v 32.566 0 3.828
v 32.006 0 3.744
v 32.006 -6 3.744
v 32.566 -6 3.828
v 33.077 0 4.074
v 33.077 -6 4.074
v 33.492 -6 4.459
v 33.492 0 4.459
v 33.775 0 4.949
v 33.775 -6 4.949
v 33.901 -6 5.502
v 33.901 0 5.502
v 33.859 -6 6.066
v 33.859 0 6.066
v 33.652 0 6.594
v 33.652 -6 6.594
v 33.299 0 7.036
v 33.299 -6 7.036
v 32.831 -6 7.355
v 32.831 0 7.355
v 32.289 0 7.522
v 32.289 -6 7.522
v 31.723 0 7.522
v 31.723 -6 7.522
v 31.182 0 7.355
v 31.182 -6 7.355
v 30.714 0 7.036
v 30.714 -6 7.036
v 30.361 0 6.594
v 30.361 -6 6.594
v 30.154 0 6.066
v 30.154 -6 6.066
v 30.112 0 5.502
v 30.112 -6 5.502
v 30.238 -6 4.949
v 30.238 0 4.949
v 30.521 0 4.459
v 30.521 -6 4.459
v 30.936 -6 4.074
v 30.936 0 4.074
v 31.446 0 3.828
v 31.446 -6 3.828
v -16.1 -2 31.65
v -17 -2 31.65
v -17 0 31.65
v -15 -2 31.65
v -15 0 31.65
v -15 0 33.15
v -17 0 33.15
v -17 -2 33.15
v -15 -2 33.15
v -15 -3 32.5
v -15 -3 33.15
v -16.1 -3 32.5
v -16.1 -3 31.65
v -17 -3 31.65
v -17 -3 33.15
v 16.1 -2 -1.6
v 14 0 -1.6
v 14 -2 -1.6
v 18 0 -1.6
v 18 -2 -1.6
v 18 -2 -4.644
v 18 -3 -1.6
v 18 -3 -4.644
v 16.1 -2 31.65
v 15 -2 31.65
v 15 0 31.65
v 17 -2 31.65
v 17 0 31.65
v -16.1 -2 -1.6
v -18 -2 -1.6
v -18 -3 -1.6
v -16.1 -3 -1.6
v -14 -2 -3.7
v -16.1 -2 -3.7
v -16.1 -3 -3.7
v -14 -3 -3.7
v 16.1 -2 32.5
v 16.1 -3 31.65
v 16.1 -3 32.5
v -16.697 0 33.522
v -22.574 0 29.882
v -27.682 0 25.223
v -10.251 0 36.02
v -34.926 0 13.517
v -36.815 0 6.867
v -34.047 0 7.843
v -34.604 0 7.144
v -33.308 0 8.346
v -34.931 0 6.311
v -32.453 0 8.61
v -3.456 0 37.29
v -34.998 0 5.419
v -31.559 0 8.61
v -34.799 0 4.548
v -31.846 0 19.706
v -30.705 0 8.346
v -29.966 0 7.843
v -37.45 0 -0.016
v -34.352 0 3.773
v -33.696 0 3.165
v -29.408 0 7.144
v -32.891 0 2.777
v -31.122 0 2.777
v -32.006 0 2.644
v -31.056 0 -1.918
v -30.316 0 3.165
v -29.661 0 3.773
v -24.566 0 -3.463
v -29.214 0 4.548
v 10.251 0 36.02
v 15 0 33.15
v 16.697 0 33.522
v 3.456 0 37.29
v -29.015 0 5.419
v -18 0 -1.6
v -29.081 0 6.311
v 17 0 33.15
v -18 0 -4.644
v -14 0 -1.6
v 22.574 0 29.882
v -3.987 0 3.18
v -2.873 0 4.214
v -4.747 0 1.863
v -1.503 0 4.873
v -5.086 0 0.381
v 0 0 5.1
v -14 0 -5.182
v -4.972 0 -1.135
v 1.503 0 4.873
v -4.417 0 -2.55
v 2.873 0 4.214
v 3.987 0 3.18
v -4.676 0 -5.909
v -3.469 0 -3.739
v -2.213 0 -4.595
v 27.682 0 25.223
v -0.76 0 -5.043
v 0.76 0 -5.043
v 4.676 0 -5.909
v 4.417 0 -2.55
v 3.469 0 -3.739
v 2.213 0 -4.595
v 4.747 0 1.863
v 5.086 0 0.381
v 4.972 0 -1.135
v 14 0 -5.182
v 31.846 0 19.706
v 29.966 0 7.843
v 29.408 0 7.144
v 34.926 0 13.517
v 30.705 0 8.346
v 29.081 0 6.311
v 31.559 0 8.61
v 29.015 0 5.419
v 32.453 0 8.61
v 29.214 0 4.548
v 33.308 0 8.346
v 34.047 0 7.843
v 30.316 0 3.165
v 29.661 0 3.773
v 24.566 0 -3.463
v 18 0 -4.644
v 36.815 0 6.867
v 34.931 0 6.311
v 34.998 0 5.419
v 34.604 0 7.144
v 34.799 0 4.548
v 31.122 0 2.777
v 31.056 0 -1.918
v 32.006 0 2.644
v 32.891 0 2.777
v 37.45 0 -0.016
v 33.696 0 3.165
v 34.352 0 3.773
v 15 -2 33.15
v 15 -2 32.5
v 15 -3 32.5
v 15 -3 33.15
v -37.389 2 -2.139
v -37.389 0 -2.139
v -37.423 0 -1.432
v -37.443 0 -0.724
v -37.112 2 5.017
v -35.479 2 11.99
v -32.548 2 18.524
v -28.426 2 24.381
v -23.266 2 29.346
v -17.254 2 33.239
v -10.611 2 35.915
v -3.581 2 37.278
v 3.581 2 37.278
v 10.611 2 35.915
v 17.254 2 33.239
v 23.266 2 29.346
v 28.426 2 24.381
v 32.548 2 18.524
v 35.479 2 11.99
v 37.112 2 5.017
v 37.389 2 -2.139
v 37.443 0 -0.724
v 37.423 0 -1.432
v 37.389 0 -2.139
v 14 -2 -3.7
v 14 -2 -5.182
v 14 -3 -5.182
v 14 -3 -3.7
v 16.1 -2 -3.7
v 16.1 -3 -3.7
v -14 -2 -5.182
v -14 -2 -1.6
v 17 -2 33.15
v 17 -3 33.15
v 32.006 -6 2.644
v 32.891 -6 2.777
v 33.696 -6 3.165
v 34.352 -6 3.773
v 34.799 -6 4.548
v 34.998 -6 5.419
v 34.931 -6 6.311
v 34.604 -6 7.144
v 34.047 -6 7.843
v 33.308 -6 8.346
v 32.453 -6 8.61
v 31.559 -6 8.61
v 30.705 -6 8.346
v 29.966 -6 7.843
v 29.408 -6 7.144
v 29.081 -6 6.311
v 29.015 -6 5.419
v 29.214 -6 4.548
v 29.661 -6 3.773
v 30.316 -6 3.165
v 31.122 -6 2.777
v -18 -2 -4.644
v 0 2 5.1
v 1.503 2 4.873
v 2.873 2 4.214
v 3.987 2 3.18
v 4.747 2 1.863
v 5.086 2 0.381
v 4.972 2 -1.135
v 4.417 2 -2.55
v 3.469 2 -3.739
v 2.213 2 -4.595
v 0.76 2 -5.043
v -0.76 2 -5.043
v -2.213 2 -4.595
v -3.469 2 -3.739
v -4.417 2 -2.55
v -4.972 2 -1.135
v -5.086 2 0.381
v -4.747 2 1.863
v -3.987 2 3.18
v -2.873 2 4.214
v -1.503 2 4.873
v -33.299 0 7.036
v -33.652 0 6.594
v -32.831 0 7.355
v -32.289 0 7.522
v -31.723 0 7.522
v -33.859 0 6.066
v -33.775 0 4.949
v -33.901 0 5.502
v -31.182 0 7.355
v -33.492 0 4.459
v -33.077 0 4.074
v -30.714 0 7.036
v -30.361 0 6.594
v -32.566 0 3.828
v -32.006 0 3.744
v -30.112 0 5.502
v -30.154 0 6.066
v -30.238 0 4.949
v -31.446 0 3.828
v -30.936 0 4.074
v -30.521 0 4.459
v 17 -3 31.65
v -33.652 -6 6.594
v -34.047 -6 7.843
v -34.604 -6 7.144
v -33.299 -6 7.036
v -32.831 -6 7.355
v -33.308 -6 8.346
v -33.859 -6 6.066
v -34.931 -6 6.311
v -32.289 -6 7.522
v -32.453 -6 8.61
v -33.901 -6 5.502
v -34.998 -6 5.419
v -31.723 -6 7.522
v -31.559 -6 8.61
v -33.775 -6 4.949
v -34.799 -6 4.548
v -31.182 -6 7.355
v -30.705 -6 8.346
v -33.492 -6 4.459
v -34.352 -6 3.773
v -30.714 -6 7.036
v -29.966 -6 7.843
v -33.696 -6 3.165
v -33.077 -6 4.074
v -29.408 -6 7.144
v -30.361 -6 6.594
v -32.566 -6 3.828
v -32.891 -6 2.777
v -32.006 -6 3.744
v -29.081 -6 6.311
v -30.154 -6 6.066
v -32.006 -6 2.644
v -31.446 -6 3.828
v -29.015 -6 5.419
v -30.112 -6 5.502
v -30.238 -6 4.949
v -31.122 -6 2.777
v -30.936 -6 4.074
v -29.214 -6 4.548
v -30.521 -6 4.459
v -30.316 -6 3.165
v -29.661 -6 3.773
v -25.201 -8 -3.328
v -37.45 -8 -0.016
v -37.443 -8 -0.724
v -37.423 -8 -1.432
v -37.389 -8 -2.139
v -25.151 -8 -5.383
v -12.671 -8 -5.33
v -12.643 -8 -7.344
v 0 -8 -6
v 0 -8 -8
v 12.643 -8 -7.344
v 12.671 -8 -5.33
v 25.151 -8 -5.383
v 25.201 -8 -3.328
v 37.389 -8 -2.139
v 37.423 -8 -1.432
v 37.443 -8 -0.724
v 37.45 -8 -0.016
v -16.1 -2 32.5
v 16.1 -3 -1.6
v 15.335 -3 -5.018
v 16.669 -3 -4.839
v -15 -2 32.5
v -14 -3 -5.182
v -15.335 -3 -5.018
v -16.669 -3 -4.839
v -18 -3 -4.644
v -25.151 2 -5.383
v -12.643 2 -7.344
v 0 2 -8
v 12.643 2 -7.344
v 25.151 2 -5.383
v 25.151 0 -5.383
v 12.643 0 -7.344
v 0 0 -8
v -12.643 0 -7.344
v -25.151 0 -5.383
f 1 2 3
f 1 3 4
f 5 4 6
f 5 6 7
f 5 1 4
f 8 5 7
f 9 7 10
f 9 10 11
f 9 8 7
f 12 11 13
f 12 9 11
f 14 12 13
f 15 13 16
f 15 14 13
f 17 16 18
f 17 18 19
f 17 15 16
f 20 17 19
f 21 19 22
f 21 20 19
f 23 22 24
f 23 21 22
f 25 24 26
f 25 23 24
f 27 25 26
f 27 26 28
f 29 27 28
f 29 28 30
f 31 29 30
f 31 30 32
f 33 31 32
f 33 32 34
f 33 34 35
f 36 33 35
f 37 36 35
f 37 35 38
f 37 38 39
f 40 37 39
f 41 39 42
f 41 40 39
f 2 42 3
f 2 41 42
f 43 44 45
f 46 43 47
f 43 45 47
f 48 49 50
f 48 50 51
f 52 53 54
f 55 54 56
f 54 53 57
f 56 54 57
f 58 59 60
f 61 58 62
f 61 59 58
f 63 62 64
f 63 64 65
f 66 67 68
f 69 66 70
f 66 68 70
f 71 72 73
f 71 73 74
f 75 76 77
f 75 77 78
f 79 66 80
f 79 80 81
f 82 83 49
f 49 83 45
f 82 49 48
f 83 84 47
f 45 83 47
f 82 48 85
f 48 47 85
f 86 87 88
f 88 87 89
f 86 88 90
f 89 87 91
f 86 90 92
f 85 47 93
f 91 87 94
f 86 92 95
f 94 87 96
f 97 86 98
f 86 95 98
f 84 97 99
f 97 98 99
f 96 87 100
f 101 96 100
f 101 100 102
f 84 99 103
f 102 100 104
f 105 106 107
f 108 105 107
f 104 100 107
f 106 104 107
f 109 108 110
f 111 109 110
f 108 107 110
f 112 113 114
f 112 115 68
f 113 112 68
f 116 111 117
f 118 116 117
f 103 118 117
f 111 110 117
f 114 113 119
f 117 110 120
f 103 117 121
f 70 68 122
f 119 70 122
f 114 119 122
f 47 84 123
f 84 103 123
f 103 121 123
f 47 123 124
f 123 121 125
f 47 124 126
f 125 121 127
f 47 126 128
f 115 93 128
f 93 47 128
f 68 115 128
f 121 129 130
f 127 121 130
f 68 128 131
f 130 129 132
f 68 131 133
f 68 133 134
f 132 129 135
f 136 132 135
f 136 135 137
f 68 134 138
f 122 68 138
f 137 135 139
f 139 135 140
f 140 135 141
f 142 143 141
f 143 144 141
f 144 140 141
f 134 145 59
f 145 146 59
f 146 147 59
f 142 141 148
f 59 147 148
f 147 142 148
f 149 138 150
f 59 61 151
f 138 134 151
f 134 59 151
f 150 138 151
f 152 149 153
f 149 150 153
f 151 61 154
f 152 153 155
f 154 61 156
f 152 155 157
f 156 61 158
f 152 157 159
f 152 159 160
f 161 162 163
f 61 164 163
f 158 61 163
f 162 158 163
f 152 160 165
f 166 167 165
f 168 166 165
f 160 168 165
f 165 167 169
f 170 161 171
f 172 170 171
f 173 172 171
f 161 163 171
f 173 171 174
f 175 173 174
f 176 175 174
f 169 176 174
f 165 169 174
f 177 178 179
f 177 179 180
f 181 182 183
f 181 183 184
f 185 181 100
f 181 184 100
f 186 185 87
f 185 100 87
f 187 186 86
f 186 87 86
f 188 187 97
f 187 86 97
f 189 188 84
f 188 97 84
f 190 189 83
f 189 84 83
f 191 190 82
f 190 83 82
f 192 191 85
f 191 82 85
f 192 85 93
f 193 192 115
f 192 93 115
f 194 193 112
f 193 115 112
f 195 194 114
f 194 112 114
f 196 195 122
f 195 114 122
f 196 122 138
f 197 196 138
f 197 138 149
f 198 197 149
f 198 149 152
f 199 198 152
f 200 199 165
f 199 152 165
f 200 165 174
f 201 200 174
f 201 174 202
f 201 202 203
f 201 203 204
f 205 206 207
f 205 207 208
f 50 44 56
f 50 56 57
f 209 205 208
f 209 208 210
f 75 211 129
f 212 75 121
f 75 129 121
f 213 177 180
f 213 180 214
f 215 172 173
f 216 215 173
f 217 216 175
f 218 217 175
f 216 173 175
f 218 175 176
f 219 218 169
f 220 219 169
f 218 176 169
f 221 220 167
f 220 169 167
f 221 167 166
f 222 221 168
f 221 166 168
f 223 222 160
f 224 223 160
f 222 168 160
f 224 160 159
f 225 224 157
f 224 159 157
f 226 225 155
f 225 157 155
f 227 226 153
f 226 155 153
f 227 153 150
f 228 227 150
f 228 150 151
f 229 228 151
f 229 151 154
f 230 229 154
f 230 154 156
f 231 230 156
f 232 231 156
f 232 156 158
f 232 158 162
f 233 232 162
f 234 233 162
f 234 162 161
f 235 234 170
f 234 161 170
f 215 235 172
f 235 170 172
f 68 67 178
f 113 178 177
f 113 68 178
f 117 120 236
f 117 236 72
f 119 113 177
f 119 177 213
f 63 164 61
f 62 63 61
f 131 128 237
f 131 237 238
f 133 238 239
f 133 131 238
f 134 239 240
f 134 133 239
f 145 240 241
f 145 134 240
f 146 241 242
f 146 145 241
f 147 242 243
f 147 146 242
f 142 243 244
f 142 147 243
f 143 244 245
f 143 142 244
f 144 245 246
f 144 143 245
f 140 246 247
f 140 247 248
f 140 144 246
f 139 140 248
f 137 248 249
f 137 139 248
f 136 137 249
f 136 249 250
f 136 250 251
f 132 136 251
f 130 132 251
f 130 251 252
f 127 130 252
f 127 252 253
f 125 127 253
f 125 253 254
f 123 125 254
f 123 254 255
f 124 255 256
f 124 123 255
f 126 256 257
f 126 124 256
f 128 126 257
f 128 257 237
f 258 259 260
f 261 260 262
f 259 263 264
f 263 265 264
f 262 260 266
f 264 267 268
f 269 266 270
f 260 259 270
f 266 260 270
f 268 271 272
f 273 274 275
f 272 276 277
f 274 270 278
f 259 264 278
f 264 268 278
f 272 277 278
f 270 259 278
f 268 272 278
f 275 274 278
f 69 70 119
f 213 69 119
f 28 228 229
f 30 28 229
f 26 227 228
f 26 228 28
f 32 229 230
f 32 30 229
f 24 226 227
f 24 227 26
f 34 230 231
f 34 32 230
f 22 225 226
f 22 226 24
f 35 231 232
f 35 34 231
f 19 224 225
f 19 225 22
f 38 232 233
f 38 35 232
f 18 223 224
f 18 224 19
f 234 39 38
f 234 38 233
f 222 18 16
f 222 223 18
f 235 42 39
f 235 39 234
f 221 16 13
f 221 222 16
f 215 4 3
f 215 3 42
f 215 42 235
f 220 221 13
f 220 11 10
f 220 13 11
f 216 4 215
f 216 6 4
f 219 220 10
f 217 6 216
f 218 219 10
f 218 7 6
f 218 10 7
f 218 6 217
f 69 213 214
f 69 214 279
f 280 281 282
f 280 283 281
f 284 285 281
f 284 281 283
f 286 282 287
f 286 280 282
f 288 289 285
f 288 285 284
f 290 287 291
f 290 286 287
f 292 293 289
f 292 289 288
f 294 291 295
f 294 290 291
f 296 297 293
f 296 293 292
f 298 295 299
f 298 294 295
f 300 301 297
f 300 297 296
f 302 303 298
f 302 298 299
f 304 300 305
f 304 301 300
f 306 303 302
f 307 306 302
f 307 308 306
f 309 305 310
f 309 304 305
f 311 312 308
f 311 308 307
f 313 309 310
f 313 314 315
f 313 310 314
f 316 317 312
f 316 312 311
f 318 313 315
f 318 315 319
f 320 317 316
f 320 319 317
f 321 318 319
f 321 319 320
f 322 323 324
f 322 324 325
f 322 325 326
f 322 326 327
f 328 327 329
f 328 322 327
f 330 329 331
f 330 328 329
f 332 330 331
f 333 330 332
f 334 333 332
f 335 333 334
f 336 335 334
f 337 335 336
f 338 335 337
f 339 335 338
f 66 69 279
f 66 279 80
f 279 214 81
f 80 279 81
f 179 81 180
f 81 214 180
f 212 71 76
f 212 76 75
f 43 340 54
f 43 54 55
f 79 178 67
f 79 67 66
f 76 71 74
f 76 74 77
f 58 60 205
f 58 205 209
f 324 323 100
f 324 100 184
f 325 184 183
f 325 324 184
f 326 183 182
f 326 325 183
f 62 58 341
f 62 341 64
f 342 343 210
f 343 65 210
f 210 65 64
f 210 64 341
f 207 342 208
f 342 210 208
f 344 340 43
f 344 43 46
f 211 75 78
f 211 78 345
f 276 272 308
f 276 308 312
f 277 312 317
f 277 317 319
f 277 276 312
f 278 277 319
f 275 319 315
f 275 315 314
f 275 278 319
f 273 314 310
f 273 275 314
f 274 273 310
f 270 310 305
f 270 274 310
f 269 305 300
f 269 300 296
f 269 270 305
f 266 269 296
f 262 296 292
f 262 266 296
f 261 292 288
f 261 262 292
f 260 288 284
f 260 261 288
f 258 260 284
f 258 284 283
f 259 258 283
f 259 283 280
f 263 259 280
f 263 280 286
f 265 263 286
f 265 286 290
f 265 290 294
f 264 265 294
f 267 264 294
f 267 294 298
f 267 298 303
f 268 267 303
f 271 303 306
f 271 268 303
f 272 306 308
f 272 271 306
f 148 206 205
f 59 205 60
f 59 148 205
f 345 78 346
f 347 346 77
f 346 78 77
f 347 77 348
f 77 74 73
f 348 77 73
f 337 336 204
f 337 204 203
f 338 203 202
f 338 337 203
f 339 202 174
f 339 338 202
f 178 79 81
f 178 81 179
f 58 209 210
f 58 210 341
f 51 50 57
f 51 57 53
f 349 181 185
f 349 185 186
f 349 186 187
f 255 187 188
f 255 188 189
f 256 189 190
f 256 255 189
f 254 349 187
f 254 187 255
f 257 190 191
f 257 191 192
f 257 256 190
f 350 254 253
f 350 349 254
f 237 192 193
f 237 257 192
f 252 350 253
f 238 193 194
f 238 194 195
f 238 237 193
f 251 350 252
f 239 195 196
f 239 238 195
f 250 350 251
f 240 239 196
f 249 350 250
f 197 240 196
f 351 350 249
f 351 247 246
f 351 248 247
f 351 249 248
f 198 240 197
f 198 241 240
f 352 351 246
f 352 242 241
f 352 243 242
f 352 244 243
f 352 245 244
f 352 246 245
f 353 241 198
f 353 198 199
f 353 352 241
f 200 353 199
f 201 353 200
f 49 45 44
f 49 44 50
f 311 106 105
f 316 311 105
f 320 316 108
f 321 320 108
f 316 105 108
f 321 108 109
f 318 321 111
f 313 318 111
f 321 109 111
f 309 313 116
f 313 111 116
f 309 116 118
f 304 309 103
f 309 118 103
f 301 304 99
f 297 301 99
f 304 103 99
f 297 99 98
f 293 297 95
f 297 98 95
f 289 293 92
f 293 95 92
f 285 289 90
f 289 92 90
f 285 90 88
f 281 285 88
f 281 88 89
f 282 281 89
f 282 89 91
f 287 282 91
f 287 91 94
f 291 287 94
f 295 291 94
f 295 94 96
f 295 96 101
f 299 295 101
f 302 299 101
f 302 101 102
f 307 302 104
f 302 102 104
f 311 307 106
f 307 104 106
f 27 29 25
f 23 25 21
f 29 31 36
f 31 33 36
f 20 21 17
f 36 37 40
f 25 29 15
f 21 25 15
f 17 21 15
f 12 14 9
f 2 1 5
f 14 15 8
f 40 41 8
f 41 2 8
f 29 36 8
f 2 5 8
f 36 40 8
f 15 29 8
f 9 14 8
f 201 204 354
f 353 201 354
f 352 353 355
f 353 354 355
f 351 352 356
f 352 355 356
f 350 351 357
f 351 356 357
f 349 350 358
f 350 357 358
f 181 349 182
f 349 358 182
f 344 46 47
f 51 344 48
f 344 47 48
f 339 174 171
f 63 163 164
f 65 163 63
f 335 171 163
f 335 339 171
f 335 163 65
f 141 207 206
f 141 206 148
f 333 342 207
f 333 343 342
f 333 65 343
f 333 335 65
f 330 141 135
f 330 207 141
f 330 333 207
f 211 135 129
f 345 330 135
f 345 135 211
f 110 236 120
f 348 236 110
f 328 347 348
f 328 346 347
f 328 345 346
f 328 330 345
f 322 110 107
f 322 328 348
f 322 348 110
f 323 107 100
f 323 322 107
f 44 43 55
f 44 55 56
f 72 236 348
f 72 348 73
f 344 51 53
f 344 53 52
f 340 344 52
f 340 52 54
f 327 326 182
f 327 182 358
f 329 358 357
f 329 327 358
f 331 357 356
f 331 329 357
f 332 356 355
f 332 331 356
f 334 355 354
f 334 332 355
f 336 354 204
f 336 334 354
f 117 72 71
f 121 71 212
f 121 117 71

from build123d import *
from build123d.topology import SkipClean

# Parameters (mm, degrees)
SKETCH_1_R      = 5.1
EXTRUDE_1_DEPTH = 2
EXTRUDE_START   = 8
EXTRUDE_2_DEPTH = 8
SKETCH_3_R      = 3
SKETCH_3_R_2    = 1.9
EXTRUDE_3_DEPTH = 6
SKETCH_4_W      = 4
SKETCH_4_H      = 4
SKETCH_4_W_2    = 2
SKETCH_4_H_2    = 1.5
EXTRUDE_4_DEPTH = 2
EXTRUDE_5_DEPTH = 1


with BuildPart() as part:
    # 草图1 → 凸台-拉伸1 (new body)
    with BuildSketch(Plane(origin=(0, 0, 0), x_dir=(1, 0, 0), z_dir=(0, 1, 0))):
        with BuildLine():
            ThreePointArc((-37.388863526, 2.139014778), (0, -37.45), (37.388863526, 2.139014778))
            ThreePointArc((37.388863526, 2.139014778), (0, 8), (-37.388863526, 2.139014778))
        make_face()
        with Locations(Location((0, 0, 0), (0, 0, 270))):
            Circle(SKETCH_1_R, mode=Mode.SUBTRACT)
    extrude(amount=EXTRUDE_1_DEPTH)

    # 草图2 → 凸台-拉伸2 (add)
    with SkipClean():  # the faces are left unmerged after this step: merging them gives an invalid solid
        with BuildSketch(Plane.XZ.offset(EXTRUDE_START)):
            with BuildLine():
                ThreePointArc((37.388863526, -2.139014778), (37.434477455, -1.078145477), (37.449996405, -0.016409414))
                ThreePointArc((37.449996405, -0.016409414), (0, -6), (-37.449996405, -0.016409414))
                ThreePointArc((-37.449996405, -0.016409414), (-37.434477455, -1.078145477), (-37.388863526, -2.139014778))
                ThreePointArc((-37.388863526, -2.139014778), (0, -8), (37.388863526, -2.139014778))
            make_face()
        extrude(amount=-EXTRUDE_2_DEPTH)

    # 草图3 → 凸台-拉伸3 (add)
    # profile 1 of 2: a face of its own
    with SkipClean():  # the faces are left unmerged after this step: merging them gives an invalid solid
        with BuildSketch(Plane.XZ):
            with Locations(Location((-32.006251973, 5.643565774, 0), (0, 0, 270))):
                Circle(SKETCH_3_R)
            with Locations(Location((-32.006251973, 5.643565774, 0), (0, 0, 270))):
                Circle(SKETCH_3_R_2, mode=Mode.SUBTRACT)
        # profile 2 of 2: a face of its own
        with BuildSketch(Plane.XZ):
            with Locations(Location((32.006251973, 5.643565774, 0), (0, 0, 270))):
                Circle(SKETCH_3_R)
            with Locations(Location((32.006251973, 5.643565774, 0), (0, 0, 270))):
                Circle(SKETCH_3_R_2, mode=Mode.SUBTRACT)
        extrude(amount=EXTRUDE_3_DEPTH)

    # 草图4 → 凸台-拉伸4 (add)
    with SkipClean():  # the faces are left unmerged after this step: merging them gives an invalid solid
        with BuildSketch(Plane.XZ):
            with Locations((16, -3.6)):
                Rectangle(SKETCH_4_W, SKETCH_4_H)
            with Locations((-16, -3.6)):
                Rectangle(SKETCH_4_W, SKETCH_4_H)
            with Locations((16, 32.4)):
                Rectangle(SKETCH_4_W_2, SKETCH_4_H_2)
            with Locations((-16, 32.4)):
                Rectangle(SKETCH_4_W_2, SKETCH_4_H_2)
        extrude(amount=EXTRUDE_4_DEPTH)

    # 草图5 → 凸台-拉伸5 (add)
    with SkipClean():  # the faces are left unmerged after this step: merging them gives an invalid solid
        with BuildSketch(Plane.XZ.offset(2)):
            Polygon((-16.1, 32.5), (-16.1, 31.65), (-17, 31.65), (-17, 33.15), (-15, 33.15), (-15, 32.5), align=None)
            Polygon((-16.1, -3.7), (-14, -3.7), (-14, -6.021052632), (-18, -6.021052632), (-18, -1.6), (-16.1, -1.6), align=None)
            Polygon((16.1, -3.7), (16.1, -1.6), (18, -1.6), (18, -5.6), (14, -5.6), (14, -3.7), align=None)
            Polygon((16.1, 32.5), (15, 32.5), (15, 33.15), (17, 33.15), (17, 31.65), (16.1, 31.65), align=None)
        extrude(amount=EXTRUDE_5_DEPTH)


solid = part.part
